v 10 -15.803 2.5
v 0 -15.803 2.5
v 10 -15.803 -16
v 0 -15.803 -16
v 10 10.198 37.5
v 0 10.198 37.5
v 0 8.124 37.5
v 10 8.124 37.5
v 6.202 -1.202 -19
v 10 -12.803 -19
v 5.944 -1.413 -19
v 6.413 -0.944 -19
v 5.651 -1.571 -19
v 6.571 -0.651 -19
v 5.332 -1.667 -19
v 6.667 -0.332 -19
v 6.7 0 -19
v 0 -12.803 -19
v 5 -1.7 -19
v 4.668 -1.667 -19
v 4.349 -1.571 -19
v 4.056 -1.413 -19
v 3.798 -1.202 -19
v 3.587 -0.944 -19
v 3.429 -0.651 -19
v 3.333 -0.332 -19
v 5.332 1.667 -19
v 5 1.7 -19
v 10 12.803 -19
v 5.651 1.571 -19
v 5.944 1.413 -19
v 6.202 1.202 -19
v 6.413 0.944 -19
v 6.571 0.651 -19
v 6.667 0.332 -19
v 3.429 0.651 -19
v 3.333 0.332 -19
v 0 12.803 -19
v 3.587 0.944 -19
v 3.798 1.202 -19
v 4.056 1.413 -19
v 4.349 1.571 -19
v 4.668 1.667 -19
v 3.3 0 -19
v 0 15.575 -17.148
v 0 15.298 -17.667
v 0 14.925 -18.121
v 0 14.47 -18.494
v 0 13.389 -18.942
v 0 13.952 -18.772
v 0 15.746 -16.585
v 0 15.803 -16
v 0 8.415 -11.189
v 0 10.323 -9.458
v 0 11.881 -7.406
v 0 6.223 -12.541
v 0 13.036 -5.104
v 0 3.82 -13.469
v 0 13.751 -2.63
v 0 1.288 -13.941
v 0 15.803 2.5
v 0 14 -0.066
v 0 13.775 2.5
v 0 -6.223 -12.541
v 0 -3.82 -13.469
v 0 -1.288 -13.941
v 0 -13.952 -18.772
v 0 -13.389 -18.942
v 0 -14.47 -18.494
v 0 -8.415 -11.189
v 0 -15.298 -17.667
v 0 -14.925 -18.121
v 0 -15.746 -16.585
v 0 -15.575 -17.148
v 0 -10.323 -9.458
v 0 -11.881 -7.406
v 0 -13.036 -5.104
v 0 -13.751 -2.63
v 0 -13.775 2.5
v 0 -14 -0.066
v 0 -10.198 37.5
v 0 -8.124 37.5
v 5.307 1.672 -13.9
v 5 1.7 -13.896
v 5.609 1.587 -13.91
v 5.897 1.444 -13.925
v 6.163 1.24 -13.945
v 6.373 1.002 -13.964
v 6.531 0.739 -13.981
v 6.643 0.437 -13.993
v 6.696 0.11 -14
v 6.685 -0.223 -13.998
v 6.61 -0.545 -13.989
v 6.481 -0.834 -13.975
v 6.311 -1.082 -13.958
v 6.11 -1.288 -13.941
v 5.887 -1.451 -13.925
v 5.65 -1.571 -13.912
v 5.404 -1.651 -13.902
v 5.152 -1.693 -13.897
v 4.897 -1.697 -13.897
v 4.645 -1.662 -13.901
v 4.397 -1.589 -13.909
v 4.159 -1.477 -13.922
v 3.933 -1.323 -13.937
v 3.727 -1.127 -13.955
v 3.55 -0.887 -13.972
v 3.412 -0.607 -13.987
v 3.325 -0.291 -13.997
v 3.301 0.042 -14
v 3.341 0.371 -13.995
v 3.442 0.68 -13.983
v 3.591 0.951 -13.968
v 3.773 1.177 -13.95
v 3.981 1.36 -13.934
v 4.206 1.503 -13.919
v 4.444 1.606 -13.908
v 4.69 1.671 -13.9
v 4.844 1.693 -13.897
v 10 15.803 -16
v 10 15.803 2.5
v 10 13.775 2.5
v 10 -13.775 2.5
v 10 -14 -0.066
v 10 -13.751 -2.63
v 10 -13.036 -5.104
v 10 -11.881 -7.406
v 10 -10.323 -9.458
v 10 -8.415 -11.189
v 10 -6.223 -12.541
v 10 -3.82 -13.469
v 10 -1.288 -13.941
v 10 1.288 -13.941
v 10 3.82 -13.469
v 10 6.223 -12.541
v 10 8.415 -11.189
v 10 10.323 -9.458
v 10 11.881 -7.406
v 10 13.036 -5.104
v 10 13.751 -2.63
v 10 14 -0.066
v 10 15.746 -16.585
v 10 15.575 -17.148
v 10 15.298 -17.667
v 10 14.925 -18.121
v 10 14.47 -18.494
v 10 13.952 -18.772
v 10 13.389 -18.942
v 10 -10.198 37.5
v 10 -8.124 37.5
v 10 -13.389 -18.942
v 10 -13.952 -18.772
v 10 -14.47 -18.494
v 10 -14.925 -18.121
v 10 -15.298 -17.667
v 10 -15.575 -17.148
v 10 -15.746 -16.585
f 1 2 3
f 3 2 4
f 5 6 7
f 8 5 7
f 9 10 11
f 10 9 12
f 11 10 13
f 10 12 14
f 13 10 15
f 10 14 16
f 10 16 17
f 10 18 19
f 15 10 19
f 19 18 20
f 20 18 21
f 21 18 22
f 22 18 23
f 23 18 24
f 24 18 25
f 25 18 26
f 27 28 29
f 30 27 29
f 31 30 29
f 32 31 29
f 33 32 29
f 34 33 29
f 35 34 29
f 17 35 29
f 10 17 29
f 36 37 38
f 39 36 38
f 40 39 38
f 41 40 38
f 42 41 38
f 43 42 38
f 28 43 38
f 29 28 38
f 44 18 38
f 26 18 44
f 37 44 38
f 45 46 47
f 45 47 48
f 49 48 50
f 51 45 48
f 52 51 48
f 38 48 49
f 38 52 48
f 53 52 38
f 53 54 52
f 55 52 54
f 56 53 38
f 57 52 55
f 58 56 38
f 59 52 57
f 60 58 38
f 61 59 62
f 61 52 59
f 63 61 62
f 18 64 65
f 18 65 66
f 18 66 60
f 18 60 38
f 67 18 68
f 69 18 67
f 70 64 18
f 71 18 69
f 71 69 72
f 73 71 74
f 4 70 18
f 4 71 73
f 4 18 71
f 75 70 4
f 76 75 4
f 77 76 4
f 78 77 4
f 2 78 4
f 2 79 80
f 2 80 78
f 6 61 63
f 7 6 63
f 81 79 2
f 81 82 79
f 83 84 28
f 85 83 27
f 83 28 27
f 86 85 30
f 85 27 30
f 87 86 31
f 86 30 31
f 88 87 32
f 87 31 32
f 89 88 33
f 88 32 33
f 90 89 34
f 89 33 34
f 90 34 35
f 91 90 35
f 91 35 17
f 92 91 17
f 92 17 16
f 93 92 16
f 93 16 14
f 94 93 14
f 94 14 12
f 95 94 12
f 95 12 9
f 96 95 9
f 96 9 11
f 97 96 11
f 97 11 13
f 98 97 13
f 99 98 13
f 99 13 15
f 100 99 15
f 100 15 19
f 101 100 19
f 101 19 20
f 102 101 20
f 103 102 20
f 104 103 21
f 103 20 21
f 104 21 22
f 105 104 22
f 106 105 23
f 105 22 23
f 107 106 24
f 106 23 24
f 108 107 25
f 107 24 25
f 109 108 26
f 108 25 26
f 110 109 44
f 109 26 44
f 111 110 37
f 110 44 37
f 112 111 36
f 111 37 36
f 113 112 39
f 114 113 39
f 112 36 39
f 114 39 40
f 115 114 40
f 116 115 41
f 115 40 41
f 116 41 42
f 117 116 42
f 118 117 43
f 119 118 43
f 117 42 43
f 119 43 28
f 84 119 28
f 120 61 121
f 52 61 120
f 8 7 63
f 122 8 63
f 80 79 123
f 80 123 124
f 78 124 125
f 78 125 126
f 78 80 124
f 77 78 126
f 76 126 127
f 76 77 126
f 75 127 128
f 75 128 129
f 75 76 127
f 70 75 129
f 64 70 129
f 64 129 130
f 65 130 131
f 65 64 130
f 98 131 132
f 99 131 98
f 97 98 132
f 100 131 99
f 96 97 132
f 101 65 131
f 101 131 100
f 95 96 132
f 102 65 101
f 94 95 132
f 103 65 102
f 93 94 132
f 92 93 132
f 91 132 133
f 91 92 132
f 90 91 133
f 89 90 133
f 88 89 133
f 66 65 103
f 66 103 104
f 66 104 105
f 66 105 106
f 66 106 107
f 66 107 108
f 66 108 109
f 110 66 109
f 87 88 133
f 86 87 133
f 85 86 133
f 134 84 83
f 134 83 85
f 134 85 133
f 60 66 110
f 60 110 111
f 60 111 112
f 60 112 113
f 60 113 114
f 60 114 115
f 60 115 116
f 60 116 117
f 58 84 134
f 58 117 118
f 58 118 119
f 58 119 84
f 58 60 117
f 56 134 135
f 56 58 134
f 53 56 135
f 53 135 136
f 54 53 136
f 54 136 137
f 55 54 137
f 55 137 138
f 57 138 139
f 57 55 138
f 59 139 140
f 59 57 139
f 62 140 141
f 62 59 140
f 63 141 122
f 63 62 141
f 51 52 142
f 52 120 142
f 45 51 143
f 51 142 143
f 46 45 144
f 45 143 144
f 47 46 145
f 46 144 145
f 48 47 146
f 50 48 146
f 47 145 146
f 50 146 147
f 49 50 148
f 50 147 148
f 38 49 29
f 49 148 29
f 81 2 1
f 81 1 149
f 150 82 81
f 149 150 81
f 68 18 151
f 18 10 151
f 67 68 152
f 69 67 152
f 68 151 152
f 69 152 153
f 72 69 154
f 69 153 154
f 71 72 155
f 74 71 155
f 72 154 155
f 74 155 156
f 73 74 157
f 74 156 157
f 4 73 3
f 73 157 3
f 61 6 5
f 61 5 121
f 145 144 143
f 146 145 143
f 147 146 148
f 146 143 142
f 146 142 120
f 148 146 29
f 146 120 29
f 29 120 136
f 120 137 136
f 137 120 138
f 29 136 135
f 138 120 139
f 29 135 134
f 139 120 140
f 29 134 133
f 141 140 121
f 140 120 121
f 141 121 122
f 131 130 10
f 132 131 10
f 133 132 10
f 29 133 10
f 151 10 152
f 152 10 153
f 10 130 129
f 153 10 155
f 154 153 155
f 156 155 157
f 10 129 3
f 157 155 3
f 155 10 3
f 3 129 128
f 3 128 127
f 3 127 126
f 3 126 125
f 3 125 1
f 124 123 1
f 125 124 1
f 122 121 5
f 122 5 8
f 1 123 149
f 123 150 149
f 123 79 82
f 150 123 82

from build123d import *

# Parameters (mm, degrees)
PAD_DEPTH    = 10
FILLET_R     = 3
SKETCH001_R  = 1.7
POCKET_DEPTH = 56.501


with BuildPart() as part:
    # Sketch → Pad (new body)
    with BuildSketch(Plane.YZ):
        with BuildLine():
            ThreePointArc((-13.774977, 2.5), (0, -14), (13.774977, 2.5))
            Line((8.124038, 37.5), (13.774977, 2.5))
            Line((10.198039, 37.5), (8.124038, 37.5))
            Line((10.198039, 37.5), (15.803481, 2.5))
            Line((15.803481, 2.5), (15.803481, -19))
            Line((-15.803481, -19), (15.803481, -19))
            Line((-15.803481, 2.5), (-15.803481, -19))
            Line((-15.803481, 2.5), (-10.198039, 37.5))
            Line((-8.124038, 37.5), (-10.198039, 37.5))
            Line((-13.774977, 2.5), (-8.124038, 37.5))
        make_face()
    extrude(amount=PAD_DEPTH)

    # Fillet
    fillet_edges = [part.edges().sort_by_distance(p)[0] for p in [
        (5, -15.803481, -19),
        (5, 15.803481, -19),
    ]]
    fillet(fillet_edges, radius=FILLET_R)

    # Sketch001 (on Face6 of Fillet) → Pocket (cut, through all)
    with BuildSketch(Plane.YX.offset(19)):
        with Locations((0, 5)):
            Circle(SKETCH001_R)
    extrude(amount=-POCKET_DEPTH, mode=Mode.SUBTRACT)


solid = part.part
